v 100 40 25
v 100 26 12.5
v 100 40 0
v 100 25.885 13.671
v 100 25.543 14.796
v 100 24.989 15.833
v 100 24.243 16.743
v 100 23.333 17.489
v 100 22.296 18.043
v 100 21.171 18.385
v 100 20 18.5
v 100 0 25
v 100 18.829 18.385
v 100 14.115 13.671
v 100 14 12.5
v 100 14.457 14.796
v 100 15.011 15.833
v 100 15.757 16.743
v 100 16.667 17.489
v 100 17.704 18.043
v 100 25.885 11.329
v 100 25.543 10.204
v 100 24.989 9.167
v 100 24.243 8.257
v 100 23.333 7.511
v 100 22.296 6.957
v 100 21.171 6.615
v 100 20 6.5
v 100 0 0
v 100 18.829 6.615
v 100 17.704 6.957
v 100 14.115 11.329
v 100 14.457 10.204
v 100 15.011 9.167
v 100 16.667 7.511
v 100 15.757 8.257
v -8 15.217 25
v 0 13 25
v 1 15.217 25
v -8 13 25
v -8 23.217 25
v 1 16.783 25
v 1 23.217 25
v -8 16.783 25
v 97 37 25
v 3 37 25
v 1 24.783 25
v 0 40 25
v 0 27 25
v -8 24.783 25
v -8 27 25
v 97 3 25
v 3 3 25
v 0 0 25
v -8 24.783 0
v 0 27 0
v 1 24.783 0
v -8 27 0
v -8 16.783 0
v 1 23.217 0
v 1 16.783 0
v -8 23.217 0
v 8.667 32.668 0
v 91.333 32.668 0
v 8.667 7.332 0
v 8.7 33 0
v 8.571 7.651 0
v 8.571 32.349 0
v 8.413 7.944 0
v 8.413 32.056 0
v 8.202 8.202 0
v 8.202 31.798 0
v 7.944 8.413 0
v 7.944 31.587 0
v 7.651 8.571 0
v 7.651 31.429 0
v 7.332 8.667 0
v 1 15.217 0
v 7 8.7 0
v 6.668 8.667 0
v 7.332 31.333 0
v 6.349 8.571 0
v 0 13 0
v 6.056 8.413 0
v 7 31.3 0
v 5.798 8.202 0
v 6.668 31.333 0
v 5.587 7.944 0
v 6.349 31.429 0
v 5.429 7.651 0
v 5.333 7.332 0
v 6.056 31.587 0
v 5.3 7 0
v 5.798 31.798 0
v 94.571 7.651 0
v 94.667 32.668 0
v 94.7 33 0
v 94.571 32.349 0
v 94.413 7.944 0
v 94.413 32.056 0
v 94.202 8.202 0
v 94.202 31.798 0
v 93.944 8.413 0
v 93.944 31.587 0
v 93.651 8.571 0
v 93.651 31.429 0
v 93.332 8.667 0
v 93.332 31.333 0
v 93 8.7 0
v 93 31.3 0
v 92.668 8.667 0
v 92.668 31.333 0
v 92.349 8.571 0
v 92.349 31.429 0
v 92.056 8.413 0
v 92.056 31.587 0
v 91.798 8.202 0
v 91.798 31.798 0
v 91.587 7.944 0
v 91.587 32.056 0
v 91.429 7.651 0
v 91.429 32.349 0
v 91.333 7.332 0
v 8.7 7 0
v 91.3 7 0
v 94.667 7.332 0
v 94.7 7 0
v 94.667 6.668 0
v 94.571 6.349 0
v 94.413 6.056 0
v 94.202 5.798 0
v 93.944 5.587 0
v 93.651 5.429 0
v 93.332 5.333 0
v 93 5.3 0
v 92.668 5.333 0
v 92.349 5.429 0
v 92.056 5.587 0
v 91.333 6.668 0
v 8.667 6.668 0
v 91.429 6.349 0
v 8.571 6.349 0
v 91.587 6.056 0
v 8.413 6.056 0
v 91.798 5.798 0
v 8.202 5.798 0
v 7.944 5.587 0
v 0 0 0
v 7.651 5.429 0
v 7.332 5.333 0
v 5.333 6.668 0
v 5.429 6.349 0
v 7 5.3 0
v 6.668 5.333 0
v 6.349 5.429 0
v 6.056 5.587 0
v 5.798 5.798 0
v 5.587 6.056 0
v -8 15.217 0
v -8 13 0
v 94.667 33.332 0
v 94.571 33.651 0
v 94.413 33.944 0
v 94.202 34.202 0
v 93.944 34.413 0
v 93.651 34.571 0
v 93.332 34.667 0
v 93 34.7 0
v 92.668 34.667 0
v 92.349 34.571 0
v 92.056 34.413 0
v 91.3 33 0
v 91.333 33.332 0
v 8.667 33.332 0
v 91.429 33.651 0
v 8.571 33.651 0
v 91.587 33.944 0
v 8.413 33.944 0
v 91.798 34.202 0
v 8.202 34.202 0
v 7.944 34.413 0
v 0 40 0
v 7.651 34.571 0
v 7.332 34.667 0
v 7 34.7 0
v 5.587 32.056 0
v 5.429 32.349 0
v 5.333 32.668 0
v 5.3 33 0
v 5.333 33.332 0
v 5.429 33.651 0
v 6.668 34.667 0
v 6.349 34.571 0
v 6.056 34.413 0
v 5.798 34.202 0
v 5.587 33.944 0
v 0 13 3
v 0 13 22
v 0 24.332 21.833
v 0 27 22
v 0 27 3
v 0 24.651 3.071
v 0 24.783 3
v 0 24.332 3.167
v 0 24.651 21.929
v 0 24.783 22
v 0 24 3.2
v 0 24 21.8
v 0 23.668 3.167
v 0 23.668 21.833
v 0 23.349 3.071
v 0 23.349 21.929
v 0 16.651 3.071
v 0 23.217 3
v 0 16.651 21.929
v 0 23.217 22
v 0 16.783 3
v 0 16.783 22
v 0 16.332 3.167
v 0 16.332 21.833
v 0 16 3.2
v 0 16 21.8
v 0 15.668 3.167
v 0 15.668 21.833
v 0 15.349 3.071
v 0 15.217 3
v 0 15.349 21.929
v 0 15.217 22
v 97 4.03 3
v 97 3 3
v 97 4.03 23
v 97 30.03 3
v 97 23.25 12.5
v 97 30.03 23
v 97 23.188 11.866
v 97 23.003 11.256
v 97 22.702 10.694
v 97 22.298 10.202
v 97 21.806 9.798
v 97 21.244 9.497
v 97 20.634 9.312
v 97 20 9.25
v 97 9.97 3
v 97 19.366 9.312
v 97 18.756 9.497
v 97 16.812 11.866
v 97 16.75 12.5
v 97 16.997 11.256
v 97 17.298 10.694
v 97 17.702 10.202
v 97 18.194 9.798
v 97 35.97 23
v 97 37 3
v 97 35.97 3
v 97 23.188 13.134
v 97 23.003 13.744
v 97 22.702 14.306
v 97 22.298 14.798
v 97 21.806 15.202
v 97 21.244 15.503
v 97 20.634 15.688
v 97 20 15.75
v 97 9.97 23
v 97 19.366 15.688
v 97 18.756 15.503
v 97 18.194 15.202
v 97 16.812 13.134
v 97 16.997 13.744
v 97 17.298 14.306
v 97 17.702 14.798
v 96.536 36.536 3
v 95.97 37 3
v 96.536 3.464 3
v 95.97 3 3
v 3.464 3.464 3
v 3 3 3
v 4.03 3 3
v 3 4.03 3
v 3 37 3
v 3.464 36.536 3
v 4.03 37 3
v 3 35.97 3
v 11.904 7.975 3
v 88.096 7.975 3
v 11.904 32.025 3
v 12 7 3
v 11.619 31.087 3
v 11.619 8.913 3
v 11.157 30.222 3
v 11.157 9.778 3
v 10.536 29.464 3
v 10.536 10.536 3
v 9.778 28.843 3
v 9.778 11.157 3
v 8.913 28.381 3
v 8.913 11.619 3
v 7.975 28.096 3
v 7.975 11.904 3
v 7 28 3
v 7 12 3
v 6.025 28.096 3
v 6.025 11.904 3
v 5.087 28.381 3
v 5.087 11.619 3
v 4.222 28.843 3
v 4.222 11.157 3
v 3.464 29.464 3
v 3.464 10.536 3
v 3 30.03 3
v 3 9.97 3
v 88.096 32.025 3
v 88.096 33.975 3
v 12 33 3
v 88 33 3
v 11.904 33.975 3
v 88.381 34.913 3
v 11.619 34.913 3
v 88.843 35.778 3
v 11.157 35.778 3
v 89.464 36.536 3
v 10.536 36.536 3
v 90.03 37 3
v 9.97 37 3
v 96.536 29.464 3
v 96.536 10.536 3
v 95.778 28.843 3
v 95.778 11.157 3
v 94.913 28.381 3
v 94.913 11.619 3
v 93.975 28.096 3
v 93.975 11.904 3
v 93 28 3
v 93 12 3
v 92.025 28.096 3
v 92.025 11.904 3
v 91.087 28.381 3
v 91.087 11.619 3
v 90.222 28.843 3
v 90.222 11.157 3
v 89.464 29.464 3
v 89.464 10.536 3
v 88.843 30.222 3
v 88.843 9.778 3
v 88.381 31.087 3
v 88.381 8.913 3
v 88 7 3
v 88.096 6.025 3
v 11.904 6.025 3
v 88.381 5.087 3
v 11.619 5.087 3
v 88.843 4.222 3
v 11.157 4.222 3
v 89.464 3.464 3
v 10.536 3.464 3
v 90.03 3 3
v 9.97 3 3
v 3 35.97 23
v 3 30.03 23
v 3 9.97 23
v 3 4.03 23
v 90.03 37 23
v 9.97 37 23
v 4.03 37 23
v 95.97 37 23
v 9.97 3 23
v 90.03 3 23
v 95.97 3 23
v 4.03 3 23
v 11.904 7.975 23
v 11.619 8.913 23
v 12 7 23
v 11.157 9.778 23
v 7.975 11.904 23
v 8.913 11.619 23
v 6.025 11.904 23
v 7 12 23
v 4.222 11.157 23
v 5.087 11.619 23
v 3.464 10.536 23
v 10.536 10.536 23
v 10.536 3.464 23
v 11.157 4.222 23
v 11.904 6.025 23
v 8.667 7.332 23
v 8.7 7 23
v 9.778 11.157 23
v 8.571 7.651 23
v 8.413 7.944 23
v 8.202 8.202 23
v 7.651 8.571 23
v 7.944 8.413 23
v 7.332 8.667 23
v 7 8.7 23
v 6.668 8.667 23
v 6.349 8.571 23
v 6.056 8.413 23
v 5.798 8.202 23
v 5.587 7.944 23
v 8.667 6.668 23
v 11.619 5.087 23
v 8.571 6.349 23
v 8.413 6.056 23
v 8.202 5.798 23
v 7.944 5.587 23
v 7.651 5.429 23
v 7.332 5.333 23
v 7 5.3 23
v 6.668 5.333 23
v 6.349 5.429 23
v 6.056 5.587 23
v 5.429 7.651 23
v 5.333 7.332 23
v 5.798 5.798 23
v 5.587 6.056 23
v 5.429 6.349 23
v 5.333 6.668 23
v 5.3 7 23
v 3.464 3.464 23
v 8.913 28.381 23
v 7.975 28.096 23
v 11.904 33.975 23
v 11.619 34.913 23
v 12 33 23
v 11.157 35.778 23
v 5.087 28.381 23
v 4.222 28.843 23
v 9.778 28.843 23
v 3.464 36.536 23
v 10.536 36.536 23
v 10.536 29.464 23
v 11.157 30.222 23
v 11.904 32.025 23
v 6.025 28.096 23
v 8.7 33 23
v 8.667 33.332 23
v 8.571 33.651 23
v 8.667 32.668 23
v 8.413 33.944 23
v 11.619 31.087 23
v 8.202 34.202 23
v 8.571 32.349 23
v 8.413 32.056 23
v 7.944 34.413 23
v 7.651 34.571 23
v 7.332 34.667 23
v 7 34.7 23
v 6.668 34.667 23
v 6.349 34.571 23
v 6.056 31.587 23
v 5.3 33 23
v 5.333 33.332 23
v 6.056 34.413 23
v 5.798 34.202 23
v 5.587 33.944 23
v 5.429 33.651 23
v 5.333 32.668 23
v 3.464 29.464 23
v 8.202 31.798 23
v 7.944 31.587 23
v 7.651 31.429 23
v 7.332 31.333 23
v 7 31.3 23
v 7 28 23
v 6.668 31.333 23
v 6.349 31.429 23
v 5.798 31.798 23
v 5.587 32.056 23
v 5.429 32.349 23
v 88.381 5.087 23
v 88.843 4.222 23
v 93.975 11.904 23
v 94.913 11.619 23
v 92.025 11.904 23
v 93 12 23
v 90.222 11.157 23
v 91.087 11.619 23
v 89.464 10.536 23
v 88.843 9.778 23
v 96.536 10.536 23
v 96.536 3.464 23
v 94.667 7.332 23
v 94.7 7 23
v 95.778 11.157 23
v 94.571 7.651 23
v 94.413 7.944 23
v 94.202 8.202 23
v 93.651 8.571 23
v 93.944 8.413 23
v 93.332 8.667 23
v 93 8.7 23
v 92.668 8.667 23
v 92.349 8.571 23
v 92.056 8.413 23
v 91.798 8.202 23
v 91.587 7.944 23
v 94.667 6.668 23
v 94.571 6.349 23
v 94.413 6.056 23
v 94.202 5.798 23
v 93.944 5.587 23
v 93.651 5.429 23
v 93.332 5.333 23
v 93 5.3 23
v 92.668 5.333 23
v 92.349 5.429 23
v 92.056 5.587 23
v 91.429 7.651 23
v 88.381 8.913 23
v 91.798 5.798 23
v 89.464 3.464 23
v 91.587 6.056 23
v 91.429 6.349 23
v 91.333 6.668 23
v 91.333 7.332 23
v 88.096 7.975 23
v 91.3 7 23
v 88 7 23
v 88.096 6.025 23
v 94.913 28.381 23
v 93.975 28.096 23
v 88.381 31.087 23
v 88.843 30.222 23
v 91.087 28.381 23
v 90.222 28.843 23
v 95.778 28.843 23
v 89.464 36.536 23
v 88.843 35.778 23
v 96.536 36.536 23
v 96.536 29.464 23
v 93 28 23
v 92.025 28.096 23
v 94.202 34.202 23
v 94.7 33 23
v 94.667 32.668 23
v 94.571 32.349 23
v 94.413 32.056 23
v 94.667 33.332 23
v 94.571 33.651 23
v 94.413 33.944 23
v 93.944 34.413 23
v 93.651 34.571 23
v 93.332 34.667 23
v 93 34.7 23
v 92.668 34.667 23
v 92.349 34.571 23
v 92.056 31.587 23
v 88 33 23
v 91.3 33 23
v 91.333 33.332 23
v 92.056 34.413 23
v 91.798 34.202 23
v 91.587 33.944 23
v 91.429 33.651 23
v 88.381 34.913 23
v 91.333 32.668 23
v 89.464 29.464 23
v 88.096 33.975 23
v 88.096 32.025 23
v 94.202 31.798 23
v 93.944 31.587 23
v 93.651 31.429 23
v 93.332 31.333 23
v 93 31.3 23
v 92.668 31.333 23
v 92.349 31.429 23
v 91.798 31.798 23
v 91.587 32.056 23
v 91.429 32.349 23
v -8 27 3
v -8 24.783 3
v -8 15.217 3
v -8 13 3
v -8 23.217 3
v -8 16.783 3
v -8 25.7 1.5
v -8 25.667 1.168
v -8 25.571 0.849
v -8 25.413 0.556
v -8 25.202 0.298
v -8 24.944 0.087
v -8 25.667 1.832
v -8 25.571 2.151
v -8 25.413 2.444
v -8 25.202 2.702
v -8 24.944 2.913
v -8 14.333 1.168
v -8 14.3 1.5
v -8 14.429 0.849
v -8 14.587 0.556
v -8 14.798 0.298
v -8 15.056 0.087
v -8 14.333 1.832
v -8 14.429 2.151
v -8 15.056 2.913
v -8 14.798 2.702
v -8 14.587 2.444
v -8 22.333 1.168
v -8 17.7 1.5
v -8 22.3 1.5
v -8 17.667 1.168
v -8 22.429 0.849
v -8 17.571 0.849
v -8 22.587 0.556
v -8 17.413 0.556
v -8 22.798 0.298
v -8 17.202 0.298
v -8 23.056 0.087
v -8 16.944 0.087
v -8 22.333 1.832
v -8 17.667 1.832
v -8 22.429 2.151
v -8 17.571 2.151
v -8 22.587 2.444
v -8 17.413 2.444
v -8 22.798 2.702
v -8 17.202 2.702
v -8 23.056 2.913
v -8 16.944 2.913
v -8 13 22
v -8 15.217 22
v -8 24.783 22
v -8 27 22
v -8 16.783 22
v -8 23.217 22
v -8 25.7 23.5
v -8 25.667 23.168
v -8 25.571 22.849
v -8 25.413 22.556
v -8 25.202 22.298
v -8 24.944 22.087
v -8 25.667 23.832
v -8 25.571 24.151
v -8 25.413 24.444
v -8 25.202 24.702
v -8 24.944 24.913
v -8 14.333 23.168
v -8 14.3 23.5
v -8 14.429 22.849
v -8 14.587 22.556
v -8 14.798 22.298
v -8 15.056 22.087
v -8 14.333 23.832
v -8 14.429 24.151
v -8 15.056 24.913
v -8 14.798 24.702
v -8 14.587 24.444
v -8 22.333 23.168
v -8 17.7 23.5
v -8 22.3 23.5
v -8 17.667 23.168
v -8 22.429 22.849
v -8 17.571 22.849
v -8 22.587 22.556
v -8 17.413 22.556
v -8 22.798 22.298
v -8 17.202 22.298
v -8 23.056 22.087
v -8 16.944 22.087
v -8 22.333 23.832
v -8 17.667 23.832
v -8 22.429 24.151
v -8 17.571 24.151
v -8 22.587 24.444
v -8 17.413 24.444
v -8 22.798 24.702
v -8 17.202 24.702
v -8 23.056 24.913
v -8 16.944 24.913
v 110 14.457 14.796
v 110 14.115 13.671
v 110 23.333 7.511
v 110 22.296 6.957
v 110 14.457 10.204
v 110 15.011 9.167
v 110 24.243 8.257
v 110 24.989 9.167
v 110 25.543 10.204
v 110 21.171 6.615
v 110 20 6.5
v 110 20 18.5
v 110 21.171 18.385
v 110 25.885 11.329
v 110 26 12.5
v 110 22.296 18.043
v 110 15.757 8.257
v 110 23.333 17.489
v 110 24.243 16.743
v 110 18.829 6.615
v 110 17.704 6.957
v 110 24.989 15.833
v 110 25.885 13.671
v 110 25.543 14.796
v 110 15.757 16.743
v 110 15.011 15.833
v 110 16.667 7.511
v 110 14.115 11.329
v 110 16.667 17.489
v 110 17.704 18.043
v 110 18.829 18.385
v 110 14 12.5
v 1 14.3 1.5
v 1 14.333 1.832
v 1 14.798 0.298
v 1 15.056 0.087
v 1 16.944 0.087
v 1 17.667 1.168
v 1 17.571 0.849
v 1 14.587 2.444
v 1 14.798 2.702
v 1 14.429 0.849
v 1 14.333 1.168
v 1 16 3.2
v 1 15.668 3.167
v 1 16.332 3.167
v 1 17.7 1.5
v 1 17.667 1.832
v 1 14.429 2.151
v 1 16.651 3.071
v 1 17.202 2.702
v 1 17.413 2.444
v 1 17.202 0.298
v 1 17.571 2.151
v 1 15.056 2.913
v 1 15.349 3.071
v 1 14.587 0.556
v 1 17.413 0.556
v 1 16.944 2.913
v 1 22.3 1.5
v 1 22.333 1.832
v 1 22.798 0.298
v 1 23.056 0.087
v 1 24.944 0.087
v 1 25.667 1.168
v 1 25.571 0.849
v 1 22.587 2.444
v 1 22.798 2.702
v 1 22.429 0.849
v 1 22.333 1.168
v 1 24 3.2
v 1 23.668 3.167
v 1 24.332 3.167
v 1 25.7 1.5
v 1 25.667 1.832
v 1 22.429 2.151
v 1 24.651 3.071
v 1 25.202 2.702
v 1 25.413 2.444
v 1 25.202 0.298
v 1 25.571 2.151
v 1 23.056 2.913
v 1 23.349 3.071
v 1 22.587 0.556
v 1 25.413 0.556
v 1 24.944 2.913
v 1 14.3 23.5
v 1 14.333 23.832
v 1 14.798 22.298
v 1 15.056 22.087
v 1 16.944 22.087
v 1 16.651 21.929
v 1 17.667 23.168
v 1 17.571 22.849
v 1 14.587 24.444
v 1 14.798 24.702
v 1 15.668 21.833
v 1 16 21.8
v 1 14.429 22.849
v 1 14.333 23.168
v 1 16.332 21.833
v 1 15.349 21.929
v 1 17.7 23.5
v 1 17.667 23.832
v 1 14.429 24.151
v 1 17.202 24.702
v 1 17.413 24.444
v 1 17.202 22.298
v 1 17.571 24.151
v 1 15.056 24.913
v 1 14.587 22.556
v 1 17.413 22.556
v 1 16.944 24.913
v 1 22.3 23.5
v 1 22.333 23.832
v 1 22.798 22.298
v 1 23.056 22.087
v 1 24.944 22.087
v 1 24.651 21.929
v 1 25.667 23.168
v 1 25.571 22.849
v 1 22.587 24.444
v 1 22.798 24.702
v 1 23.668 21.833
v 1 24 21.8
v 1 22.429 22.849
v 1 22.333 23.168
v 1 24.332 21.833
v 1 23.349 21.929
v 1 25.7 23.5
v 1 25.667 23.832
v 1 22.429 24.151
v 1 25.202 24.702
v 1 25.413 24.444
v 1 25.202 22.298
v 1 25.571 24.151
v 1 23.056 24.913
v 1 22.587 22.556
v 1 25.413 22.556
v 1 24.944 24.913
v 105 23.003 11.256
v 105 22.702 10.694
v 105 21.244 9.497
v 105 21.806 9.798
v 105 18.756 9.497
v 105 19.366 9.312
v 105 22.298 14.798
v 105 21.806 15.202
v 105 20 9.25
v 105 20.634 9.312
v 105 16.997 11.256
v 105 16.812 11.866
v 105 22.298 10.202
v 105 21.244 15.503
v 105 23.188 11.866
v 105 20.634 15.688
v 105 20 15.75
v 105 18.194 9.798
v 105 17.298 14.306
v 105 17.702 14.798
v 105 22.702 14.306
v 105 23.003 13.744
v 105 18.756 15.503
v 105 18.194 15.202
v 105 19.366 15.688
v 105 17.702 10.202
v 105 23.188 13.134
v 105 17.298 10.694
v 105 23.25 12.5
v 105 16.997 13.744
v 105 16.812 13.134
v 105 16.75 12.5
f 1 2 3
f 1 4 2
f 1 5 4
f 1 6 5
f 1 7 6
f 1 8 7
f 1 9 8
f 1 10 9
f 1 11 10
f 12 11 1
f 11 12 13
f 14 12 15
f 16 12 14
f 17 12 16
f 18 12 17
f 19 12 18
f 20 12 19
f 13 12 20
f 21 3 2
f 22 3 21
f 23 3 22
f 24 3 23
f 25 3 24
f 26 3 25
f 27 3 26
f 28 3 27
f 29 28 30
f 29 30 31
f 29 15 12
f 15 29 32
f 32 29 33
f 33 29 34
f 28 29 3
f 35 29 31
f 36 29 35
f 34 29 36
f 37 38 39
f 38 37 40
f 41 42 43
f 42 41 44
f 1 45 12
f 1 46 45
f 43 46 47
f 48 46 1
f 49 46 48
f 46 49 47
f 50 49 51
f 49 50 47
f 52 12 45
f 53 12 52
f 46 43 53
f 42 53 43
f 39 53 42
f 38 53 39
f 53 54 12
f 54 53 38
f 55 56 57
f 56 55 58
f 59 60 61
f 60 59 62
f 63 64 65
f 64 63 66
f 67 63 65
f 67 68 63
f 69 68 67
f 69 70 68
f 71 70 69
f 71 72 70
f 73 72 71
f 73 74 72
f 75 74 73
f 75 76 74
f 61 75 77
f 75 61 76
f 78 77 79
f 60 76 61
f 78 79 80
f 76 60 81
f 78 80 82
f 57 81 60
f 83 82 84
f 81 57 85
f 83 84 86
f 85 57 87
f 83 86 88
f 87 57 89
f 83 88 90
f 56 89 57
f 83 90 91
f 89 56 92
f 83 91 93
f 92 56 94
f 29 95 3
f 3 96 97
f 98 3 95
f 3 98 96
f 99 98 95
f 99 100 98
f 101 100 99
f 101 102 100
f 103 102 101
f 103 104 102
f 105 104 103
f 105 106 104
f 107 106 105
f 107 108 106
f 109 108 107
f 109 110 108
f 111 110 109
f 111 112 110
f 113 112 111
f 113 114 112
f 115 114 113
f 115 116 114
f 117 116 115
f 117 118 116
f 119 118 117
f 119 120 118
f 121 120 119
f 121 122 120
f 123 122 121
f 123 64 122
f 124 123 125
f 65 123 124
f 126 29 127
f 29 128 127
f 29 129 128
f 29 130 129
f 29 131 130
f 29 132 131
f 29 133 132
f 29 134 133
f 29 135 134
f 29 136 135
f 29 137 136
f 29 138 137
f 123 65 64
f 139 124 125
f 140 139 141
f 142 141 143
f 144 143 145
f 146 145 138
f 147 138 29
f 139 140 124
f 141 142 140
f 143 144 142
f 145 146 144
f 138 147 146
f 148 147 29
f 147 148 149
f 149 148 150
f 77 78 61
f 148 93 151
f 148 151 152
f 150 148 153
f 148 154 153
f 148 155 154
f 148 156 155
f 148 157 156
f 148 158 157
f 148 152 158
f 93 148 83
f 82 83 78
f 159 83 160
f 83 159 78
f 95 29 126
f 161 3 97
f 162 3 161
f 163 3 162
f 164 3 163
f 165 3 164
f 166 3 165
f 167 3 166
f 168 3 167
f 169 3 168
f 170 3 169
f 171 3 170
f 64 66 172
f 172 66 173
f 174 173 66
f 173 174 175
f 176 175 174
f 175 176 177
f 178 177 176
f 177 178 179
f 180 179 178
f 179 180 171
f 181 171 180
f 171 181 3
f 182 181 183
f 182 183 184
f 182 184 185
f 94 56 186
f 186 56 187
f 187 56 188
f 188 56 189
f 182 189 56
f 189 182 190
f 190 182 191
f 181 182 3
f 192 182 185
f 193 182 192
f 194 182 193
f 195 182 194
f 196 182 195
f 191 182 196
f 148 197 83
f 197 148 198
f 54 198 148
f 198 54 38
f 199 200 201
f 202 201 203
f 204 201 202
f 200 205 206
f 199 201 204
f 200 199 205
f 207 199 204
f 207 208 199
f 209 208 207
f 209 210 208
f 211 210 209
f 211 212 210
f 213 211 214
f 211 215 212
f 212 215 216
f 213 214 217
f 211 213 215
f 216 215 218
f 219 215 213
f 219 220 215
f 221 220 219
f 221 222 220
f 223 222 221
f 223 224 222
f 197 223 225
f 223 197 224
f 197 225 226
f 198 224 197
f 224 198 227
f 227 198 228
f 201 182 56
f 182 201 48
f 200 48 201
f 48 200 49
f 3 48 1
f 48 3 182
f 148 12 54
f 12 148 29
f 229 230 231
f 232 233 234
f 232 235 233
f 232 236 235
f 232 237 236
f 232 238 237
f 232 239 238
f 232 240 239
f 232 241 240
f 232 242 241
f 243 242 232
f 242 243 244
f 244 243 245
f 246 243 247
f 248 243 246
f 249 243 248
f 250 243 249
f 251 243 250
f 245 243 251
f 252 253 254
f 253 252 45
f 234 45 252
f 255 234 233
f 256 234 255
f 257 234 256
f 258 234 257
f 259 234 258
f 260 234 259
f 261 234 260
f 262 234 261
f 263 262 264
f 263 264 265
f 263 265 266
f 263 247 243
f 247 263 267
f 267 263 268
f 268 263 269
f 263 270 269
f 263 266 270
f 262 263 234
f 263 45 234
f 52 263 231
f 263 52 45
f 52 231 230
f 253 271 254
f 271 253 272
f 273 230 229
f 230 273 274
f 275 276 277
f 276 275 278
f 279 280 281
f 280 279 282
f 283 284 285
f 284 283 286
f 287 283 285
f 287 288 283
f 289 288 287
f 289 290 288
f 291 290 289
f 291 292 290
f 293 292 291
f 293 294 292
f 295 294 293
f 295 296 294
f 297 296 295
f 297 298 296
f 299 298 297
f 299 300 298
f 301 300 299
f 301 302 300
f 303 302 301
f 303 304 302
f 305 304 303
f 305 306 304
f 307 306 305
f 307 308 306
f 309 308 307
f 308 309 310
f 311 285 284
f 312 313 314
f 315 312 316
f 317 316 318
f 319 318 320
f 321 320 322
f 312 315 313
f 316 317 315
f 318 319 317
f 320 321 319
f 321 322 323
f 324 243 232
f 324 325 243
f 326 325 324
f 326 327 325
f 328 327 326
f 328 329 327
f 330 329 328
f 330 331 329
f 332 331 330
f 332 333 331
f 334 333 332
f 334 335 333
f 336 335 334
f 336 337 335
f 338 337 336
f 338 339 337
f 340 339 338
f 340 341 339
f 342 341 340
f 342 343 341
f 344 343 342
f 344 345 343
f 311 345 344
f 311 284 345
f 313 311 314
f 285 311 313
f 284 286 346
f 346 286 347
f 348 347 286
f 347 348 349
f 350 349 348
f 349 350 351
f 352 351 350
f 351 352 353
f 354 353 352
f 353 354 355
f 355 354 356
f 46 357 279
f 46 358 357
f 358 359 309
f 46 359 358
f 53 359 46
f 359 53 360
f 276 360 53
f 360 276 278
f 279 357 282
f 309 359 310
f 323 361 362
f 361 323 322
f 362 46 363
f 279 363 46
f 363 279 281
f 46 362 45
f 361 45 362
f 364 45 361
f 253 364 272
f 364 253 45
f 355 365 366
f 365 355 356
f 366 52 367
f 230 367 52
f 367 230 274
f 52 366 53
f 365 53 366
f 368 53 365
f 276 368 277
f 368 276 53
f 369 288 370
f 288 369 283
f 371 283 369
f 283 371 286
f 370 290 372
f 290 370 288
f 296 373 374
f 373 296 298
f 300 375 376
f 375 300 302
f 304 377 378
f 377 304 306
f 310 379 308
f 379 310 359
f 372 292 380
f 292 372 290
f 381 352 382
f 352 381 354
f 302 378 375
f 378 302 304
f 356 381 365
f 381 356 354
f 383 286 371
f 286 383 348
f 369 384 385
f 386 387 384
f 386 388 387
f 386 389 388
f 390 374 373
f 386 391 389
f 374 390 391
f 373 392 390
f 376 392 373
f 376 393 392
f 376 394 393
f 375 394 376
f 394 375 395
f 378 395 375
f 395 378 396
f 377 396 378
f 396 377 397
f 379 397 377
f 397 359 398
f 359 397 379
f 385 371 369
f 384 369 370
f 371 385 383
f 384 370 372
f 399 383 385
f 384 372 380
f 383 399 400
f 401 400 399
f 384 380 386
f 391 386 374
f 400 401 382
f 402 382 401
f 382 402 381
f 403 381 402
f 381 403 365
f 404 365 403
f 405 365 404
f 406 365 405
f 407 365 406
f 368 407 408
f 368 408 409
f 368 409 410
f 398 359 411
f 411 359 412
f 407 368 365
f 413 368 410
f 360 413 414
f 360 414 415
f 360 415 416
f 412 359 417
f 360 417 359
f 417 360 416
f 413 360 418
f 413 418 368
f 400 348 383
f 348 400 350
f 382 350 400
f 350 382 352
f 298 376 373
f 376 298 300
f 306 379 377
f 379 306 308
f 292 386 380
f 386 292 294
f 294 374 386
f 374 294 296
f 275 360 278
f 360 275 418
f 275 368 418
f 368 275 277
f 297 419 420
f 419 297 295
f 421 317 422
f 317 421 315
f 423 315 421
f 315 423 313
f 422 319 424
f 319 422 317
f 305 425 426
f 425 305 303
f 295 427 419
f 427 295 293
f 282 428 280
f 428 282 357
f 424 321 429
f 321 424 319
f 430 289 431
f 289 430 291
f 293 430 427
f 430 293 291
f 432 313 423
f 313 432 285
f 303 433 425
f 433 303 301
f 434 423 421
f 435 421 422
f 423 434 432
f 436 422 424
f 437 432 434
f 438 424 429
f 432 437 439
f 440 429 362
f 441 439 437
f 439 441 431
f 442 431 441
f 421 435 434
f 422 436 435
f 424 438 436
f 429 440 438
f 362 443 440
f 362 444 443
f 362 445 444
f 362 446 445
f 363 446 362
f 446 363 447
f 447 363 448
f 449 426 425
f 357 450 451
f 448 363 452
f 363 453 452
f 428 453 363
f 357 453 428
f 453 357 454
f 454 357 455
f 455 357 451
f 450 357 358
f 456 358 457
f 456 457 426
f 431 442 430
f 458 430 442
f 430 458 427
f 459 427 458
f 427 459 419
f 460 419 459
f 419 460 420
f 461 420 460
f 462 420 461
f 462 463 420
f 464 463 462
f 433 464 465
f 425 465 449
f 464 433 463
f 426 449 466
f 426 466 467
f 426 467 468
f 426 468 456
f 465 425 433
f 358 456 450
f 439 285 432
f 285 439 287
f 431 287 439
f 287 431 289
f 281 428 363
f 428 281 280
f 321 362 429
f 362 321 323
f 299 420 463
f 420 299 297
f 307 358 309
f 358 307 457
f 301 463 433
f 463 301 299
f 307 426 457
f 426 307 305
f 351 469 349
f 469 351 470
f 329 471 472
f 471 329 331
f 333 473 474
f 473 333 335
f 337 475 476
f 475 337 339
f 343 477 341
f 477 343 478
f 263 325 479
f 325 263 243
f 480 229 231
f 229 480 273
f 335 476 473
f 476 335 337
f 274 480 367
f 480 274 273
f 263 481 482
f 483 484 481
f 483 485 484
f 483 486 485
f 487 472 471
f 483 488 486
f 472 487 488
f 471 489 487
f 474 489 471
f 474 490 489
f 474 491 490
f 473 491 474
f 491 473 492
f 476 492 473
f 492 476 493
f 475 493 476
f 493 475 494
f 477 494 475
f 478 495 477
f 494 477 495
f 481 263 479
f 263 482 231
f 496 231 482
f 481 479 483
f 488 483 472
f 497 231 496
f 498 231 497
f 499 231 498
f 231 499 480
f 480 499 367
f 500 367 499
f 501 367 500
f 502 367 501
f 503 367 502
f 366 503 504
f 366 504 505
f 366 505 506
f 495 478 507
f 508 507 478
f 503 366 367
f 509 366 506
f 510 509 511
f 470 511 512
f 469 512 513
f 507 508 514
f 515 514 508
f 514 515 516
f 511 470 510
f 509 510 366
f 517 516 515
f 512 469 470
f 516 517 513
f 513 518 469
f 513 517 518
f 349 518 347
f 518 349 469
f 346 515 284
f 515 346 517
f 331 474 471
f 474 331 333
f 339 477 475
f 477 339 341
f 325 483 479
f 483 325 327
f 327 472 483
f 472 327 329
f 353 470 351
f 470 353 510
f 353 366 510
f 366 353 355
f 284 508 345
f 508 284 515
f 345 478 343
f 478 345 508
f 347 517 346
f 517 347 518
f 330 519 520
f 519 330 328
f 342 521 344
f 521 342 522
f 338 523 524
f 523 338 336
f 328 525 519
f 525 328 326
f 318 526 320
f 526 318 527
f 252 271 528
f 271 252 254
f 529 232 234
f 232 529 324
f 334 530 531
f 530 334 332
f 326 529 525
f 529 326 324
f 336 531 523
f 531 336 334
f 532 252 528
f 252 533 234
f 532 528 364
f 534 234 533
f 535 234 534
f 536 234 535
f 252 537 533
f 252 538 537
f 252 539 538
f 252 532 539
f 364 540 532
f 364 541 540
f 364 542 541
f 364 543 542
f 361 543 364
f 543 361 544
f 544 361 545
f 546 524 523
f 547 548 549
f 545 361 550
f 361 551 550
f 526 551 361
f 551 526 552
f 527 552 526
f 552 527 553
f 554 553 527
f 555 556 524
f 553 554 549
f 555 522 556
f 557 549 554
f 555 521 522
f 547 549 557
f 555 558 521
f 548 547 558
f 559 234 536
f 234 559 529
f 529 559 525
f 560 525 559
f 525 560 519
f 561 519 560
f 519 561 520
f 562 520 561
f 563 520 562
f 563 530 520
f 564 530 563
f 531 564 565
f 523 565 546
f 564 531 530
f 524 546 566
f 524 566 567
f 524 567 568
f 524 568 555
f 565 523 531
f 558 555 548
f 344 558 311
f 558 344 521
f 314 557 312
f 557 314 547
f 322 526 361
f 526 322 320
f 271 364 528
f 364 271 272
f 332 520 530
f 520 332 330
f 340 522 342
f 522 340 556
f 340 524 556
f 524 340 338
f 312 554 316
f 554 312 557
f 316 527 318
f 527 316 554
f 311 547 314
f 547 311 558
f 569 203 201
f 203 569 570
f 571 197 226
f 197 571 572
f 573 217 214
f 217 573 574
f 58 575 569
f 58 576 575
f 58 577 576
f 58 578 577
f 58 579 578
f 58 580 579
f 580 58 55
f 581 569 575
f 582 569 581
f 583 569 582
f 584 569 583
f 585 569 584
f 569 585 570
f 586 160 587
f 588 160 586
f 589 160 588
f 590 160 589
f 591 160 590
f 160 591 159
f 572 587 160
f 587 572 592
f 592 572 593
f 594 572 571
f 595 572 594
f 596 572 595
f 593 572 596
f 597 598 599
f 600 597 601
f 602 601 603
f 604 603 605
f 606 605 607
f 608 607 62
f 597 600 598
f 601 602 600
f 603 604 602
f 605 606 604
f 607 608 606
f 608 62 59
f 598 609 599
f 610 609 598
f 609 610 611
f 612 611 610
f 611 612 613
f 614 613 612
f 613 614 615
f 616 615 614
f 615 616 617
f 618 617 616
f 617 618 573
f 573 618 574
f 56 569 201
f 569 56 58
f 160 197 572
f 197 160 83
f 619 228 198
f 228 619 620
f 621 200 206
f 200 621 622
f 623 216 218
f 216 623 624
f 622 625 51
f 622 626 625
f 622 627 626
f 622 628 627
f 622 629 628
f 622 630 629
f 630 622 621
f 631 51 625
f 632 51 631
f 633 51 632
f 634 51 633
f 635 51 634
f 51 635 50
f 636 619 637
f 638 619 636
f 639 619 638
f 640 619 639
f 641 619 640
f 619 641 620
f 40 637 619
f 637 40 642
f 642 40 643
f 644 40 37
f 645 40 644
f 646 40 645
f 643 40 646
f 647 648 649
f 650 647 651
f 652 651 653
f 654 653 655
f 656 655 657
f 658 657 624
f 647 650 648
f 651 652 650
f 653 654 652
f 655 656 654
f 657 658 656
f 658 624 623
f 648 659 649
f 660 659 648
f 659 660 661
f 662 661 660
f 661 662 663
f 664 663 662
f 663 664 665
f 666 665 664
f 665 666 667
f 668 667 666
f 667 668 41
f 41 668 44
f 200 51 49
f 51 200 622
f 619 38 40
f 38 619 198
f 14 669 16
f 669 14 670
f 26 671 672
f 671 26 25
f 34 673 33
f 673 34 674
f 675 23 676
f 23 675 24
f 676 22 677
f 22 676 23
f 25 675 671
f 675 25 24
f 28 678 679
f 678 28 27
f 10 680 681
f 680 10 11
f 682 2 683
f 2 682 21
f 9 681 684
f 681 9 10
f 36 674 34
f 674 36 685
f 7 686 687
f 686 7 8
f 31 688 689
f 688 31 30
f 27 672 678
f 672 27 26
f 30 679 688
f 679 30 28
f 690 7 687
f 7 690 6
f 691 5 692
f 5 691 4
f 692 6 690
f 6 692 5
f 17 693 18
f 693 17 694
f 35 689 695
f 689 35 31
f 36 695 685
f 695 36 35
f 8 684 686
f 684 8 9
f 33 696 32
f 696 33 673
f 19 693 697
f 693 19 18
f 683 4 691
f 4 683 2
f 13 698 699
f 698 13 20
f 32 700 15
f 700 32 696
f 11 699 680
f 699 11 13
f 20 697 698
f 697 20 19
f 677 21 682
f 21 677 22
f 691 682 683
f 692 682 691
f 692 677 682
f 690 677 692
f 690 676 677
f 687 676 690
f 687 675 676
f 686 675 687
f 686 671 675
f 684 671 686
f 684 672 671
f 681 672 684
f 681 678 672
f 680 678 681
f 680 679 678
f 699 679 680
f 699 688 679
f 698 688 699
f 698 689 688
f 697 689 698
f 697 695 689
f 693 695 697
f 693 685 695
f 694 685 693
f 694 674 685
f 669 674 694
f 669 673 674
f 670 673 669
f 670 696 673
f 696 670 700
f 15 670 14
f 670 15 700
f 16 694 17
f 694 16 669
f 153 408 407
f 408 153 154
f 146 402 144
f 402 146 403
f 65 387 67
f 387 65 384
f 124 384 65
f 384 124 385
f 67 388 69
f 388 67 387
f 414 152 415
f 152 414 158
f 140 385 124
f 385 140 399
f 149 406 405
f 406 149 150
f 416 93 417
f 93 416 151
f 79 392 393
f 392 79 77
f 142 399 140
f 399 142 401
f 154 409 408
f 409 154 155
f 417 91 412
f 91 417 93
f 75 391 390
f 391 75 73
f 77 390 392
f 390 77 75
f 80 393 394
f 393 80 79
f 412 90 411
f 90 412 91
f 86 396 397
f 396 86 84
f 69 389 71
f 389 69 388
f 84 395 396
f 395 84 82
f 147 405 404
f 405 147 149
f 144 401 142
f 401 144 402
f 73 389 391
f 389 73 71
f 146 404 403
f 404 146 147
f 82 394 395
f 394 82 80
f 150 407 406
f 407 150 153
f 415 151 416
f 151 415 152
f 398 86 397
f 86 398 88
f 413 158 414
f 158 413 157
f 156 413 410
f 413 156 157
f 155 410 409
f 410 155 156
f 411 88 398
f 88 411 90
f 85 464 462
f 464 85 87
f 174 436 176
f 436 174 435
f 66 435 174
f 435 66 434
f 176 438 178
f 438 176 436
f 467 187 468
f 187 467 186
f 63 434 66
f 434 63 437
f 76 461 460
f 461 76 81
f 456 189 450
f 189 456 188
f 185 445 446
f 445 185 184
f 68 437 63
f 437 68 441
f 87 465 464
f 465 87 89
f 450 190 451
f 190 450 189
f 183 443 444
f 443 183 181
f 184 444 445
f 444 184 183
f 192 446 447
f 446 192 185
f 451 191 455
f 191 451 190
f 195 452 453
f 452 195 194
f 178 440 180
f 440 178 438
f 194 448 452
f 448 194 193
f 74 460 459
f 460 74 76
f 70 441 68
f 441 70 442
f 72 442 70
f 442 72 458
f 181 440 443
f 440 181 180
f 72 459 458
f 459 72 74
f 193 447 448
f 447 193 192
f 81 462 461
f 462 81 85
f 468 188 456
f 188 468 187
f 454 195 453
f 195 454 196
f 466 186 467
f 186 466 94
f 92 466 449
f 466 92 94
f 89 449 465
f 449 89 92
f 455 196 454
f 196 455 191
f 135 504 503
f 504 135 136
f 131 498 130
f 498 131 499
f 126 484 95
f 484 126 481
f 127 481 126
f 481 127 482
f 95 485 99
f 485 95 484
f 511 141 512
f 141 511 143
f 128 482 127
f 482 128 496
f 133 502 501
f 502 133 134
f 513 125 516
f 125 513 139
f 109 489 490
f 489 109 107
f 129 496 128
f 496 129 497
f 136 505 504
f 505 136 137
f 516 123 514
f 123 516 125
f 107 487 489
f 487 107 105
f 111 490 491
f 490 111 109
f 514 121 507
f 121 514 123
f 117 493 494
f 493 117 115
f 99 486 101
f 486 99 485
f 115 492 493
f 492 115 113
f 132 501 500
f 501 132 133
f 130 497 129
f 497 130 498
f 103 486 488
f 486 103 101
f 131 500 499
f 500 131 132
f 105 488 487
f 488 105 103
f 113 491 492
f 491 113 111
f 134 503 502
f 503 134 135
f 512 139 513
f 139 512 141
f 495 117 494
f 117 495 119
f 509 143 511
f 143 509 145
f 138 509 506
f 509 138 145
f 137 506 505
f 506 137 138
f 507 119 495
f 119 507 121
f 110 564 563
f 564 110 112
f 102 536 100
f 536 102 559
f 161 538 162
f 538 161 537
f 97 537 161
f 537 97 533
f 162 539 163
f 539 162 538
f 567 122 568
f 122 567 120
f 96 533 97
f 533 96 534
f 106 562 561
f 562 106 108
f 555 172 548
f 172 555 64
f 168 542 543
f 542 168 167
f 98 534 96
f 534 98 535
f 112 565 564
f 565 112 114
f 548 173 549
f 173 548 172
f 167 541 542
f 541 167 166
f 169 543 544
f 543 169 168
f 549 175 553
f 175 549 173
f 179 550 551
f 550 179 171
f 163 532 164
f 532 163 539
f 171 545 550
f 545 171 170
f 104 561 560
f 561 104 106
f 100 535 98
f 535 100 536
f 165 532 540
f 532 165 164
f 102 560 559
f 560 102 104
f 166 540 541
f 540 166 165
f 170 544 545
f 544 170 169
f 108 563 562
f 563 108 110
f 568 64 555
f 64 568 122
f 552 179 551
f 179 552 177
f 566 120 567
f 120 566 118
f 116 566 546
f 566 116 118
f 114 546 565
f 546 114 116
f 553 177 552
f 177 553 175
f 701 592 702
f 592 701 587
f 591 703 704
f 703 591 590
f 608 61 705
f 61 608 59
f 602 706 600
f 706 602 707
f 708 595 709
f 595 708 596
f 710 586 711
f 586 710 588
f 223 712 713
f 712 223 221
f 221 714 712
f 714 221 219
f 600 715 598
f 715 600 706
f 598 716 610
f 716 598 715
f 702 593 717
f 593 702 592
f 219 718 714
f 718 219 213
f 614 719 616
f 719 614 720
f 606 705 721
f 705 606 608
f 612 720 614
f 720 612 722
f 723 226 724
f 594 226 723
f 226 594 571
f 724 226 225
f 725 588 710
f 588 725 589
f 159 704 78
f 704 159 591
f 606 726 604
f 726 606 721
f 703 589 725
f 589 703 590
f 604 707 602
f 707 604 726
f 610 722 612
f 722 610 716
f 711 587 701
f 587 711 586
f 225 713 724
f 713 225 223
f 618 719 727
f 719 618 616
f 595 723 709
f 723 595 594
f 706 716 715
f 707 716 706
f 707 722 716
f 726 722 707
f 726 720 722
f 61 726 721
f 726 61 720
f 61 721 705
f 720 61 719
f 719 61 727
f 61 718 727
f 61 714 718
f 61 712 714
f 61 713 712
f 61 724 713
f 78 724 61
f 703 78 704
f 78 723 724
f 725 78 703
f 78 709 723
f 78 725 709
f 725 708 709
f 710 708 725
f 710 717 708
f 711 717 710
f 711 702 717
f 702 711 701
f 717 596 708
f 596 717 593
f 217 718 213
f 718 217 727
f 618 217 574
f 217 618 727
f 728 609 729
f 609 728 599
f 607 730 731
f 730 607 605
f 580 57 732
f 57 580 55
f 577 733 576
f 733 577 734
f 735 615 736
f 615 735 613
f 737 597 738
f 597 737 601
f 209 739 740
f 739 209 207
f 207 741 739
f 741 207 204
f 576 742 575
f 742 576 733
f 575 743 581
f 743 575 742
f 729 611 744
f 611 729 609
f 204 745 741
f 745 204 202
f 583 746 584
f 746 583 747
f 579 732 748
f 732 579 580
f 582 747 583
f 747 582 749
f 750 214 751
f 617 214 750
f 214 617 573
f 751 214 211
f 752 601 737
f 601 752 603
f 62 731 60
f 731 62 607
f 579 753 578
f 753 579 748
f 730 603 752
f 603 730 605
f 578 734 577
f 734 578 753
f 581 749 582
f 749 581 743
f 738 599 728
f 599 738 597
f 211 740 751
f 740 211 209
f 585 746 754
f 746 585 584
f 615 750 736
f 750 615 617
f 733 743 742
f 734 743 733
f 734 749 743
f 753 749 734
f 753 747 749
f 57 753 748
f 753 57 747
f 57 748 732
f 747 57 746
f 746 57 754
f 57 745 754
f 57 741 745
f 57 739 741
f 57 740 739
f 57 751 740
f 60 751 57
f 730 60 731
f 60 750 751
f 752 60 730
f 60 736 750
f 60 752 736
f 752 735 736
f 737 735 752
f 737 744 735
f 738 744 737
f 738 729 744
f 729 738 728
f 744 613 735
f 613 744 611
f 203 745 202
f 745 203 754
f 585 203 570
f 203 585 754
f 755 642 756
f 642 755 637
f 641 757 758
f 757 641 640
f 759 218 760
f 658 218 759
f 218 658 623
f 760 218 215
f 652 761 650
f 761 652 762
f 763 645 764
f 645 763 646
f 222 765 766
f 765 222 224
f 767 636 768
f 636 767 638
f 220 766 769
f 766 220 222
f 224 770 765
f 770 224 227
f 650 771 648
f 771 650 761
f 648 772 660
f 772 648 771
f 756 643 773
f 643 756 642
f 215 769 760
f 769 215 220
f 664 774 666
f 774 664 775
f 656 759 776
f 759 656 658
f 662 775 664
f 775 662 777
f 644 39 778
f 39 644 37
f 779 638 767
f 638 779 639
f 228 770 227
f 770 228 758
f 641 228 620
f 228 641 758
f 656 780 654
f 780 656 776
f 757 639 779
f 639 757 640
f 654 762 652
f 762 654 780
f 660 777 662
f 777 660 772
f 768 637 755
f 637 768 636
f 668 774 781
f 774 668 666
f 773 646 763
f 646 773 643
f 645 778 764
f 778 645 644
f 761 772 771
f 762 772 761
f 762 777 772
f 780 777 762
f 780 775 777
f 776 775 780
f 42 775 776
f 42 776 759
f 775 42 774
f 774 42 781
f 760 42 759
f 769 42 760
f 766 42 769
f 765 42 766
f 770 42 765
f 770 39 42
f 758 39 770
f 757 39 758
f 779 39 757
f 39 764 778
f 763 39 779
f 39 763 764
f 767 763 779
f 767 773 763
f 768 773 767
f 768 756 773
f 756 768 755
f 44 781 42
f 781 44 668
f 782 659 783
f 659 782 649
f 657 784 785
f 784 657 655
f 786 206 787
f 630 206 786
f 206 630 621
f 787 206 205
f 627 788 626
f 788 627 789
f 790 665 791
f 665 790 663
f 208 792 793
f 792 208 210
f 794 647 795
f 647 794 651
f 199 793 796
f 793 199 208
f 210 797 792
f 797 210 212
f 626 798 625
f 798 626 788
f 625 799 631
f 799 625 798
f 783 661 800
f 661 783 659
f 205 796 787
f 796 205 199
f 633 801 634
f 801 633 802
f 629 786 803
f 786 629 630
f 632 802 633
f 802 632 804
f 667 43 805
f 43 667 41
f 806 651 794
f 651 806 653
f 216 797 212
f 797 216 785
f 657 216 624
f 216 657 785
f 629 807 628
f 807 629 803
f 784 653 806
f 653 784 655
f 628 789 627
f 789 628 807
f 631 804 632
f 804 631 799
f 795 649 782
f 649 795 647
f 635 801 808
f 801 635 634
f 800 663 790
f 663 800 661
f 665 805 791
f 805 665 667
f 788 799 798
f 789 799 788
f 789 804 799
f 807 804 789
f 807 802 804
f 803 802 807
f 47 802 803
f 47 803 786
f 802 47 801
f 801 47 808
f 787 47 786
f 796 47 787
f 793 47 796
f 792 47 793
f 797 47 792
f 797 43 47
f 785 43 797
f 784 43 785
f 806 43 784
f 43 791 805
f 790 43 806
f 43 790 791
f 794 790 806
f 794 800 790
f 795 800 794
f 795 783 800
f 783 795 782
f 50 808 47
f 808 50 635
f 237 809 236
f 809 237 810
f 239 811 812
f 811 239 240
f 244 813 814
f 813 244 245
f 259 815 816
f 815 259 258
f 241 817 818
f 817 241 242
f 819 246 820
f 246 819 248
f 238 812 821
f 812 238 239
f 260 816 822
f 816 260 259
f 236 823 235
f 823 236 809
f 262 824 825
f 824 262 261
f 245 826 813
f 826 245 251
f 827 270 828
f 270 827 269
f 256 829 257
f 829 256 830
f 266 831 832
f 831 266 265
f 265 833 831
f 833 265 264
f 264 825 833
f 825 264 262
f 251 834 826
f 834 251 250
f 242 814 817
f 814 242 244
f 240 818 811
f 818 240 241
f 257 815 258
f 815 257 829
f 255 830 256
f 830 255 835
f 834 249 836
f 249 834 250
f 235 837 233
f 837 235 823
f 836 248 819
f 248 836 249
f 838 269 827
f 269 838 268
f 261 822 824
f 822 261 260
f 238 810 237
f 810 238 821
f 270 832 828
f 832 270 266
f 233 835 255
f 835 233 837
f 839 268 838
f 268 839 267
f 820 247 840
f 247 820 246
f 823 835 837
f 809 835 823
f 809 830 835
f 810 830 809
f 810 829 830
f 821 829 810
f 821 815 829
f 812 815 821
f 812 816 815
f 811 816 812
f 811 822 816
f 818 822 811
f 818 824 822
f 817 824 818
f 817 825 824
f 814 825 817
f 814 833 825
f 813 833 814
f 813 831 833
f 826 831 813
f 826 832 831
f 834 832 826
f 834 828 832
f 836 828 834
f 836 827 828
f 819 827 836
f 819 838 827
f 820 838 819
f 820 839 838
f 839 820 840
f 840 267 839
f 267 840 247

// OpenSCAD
$fn = 32;

// ----------------------------------------------------------------------
// Enclosure body: 100 x 40 x 25 mm, wall 3 mm
// ----------------------------------------------------------------------

// --- parameters (mm) ---
length = 100;             // outside length, X
width = 40;               // outside width, Y
height = 25;              // outside height, Z
wall = 3;                 // side wall thickness
floor_t = 3;              // floor thickness
boss_d = 10;              // corner boss diameter
boss_h = 20;              // corner boss height above the floor
boss_hole_d = 3.4;        // lid screw clearance in the boss
boss_lip = 7;             // boss centre inset from the corner
ear_w = 14;               // mounting ear width
ear_t = 3;                // mounting ear thickness
ear_ext = 8;              // mounting ear reach
ear_hole_d = 3.4;         // mounting ear drills
nipple_d = 12;            // cable gland boss diameter
nipple_h = 10;            // cable gland boss height
nipple_bore = 6.5;        // cable gland bore

module shell() {
  difference() {
    cube([length, width, height]);
    /* hollow, open at the top */
    translate([wall, wall, floor_t])
      cube([length - 2 * wall, width - 2 * wall, height]);
  }
}

module bosses() {
  /* corner bosses, sunk 1 mm into the floor */
  for (sx = [0, 1]) for (sy = [0, 1])
    translate([sx * (length - 2 * boss_lip) + boss_lip, sy * (width - 2 * boss_lip) + boss_lip, floor_t - 1])
      cylinder(h = boss_h + 1, d = boss_d);
}

module gland() {
  /* boss on the short wall, sunk 1 mm into it */
  translate([length - 1, width / 2, height * 0.5]) rotate([0, 90, 0])
    cylinder(h = nipple_h + 1, d = nipple_d);
}

module ears() {
  /* mounting ears on the short walls, sunk into the wall */
  for (sz = [0, 1])
    translate([-ear_ext, width / 2 - ear_w / 2, sz * (height - ear_t)])
      cube([ear_ext + 2.5, ear_w, ear_t]);
}

difference() {
  union() {
    shell();
    bosses();
    gland();
    ears();
  }
  /* boss screw holes */
  for (sx = [0, 1]) for (sy = [0, 1])
    translate([sx * (length - 2 * boss_lip) + boss_lip, sy * (width - 2 * boss_lip) + boss_lip, -1]) cylinder(h = floor_t + boss_h + 2, d = boss_hole_d);
  translate([length, width / 2, height * 0.5]) rotate([0, 90, 0]) translate([0, 0, -nipple_h - 2]) cylinder(h = nipple_h + wall + 4, d = nipple_bore);
  for (sz = [0, 1]) for (sx = [0, 1]) translate([-ear_ext - 1, width / 2 + (2 * sx - 1) * (ear_w / 2 - 3), sz * (height - ear_t) + ear_t / 2]) rotate([0, 90, 0]) cylinder(h = ear_ext + 2, d = ear_hole_d);
}
